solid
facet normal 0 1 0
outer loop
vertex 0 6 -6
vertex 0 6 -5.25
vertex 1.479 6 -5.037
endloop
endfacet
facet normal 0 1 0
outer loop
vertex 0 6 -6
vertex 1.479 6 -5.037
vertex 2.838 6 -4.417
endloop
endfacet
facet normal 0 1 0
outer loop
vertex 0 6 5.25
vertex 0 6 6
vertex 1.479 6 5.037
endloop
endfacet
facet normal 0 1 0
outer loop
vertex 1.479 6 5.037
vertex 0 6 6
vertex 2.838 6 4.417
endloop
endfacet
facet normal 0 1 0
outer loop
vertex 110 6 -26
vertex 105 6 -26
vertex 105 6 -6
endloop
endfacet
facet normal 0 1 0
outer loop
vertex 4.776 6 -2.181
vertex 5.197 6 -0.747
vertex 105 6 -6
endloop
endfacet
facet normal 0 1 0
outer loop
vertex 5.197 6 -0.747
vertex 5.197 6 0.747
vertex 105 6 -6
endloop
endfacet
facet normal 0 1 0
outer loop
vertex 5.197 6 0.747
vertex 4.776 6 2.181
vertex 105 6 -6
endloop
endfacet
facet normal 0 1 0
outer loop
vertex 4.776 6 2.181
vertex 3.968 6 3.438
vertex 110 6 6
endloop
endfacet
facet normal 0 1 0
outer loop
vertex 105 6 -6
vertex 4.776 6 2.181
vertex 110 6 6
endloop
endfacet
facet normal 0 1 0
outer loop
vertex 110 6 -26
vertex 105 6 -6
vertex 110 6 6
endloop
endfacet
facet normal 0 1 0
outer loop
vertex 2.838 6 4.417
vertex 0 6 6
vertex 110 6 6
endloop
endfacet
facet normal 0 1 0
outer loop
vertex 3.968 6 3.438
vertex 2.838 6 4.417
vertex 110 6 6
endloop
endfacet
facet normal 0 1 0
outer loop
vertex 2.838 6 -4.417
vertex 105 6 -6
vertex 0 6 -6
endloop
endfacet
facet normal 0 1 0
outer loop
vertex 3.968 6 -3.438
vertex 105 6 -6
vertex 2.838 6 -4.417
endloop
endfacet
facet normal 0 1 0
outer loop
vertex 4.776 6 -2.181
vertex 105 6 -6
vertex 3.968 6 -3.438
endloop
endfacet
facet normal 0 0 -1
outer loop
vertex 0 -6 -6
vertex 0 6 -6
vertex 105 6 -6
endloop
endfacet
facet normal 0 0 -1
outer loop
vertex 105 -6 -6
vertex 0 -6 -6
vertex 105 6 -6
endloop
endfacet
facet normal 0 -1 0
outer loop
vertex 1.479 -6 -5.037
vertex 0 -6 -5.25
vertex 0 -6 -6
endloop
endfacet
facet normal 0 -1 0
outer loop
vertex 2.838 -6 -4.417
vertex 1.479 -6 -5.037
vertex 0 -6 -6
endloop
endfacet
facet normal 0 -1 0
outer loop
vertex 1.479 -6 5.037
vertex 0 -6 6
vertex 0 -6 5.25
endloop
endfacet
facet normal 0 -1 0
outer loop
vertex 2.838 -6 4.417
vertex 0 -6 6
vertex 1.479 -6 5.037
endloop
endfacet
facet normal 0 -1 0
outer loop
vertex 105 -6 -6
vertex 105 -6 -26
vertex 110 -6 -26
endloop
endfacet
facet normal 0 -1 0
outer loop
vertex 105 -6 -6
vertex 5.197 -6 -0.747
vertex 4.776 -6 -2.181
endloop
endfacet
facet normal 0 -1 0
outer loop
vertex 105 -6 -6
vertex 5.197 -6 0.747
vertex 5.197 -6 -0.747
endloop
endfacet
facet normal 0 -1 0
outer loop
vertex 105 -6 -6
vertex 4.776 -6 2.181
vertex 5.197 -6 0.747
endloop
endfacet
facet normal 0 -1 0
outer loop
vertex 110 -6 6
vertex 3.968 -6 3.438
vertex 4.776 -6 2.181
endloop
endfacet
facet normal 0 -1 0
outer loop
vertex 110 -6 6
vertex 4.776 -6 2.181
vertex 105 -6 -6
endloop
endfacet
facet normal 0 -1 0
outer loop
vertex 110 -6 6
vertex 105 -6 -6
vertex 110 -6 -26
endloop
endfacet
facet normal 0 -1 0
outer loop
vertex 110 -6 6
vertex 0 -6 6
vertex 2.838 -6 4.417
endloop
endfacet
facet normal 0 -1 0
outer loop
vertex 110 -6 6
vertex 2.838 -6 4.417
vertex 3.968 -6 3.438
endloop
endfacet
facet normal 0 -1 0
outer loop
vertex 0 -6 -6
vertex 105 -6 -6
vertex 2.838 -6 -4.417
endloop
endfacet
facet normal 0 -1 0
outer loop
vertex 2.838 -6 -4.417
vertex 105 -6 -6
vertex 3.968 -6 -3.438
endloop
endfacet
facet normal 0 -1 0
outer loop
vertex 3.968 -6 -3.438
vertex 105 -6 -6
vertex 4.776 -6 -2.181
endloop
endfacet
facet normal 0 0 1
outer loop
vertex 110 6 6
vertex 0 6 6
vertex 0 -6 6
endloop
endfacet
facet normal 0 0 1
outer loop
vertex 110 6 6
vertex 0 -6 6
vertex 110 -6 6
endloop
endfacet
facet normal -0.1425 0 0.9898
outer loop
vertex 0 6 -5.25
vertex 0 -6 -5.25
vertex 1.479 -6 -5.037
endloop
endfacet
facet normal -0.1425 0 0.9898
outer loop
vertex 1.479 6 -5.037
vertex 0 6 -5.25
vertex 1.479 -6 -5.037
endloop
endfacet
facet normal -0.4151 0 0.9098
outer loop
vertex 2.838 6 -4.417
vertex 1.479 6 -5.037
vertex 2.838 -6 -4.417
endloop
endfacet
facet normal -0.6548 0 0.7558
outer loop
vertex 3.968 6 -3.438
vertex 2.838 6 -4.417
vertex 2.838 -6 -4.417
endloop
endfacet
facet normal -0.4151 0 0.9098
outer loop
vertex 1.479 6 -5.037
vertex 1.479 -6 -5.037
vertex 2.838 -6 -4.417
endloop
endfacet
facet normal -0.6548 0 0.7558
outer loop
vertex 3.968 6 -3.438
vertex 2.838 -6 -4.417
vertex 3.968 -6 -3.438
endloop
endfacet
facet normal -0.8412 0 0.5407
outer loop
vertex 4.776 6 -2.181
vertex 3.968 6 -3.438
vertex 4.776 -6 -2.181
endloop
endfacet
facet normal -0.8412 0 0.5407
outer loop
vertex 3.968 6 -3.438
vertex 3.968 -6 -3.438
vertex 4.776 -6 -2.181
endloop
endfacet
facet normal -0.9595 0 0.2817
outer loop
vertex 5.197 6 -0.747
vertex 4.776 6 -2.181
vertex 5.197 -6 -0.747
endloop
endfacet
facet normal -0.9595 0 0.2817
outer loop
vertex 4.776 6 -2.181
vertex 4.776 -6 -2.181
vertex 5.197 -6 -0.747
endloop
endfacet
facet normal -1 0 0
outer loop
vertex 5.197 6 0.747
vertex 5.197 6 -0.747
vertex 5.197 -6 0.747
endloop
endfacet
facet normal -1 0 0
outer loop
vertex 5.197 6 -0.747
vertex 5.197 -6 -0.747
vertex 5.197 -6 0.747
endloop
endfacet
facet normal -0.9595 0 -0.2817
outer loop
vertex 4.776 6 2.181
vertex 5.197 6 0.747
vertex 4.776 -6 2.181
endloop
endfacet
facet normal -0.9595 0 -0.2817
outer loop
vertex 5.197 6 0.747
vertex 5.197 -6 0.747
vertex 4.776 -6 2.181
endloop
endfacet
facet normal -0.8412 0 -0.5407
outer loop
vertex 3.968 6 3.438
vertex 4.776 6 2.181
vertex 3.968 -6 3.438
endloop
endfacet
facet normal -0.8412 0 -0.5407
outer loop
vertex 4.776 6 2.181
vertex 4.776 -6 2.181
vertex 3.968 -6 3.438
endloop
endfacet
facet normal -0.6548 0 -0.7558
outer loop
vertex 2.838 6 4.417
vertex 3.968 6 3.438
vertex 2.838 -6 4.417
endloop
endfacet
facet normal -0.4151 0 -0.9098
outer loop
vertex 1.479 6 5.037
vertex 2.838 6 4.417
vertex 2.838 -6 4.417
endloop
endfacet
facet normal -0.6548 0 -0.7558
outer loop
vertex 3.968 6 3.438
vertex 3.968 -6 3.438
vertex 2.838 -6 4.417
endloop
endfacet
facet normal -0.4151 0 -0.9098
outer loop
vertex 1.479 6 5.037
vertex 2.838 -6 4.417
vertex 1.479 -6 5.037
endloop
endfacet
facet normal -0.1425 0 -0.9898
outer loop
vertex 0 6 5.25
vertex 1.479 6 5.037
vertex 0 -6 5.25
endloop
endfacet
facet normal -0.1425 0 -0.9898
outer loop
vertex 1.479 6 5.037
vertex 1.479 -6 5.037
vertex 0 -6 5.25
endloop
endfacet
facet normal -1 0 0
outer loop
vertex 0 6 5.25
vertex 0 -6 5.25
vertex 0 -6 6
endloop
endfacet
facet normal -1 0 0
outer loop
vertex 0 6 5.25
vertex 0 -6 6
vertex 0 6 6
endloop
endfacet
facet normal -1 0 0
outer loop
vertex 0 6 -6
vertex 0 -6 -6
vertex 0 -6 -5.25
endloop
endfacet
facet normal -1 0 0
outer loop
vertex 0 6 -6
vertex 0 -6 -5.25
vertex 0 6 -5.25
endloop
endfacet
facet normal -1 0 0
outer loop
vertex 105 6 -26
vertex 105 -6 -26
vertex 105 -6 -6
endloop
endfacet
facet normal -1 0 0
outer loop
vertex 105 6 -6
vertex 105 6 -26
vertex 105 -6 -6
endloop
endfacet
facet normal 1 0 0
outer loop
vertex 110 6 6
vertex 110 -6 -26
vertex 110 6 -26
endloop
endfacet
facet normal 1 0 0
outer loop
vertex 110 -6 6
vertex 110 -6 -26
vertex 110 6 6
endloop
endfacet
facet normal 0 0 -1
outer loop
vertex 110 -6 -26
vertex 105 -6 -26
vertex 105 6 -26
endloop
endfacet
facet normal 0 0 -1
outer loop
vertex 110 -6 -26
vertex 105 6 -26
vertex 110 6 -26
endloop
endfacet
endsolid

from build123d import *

# Parameters (mm, degrees)
BOX_W        = 110
BOX_H        = 12
BOX_DEPTH    = 12
POCKET_DEPTH = 12
SKETCH001_W  = 5
SKETCH001_H  = 20
PAD_DEPTH    = 12


with BuildPart() as part:
    # Box → Box (new body)
    with BuildSketch(Plane(origin=(0, -6, -6), x_dir=(1, 0, 0), z_dir=(0, 0, 1))):
        with Locations((55, 6)):
            Rectangle(BOX_W, BOX_H)
    extrude(amount=BOX_DEPTH)

    # Sketch → Pocket (cut)
    with BuildSketch(Plane(origin=(0, -6, -6), x_dir=(1, 0, 0), z_dir=(0, -1, 0))):
        with BuildLine():
            ThreePointArc((0, 0.75), (5.25, 6), (0, 11.25))
            Line((0, 11.25), (0, 0.75))
        make_face()
    extrude(amount=-POCKET_DEPTH, mode=Mode.SUBTRACT)

    # Sketch001 → Pad (new body)
    with BuildSketch(Plane(origin=(0, -6, -6), x_dir=(1, 0, 0), z_dir=(0, -1, 0))):
        with Locations((107.5, -10)):
            Rectangle(SKETCH001_W, SKETCH001_H)
    extrude(amount=-PAD_DEPTH)


solid = part.part
